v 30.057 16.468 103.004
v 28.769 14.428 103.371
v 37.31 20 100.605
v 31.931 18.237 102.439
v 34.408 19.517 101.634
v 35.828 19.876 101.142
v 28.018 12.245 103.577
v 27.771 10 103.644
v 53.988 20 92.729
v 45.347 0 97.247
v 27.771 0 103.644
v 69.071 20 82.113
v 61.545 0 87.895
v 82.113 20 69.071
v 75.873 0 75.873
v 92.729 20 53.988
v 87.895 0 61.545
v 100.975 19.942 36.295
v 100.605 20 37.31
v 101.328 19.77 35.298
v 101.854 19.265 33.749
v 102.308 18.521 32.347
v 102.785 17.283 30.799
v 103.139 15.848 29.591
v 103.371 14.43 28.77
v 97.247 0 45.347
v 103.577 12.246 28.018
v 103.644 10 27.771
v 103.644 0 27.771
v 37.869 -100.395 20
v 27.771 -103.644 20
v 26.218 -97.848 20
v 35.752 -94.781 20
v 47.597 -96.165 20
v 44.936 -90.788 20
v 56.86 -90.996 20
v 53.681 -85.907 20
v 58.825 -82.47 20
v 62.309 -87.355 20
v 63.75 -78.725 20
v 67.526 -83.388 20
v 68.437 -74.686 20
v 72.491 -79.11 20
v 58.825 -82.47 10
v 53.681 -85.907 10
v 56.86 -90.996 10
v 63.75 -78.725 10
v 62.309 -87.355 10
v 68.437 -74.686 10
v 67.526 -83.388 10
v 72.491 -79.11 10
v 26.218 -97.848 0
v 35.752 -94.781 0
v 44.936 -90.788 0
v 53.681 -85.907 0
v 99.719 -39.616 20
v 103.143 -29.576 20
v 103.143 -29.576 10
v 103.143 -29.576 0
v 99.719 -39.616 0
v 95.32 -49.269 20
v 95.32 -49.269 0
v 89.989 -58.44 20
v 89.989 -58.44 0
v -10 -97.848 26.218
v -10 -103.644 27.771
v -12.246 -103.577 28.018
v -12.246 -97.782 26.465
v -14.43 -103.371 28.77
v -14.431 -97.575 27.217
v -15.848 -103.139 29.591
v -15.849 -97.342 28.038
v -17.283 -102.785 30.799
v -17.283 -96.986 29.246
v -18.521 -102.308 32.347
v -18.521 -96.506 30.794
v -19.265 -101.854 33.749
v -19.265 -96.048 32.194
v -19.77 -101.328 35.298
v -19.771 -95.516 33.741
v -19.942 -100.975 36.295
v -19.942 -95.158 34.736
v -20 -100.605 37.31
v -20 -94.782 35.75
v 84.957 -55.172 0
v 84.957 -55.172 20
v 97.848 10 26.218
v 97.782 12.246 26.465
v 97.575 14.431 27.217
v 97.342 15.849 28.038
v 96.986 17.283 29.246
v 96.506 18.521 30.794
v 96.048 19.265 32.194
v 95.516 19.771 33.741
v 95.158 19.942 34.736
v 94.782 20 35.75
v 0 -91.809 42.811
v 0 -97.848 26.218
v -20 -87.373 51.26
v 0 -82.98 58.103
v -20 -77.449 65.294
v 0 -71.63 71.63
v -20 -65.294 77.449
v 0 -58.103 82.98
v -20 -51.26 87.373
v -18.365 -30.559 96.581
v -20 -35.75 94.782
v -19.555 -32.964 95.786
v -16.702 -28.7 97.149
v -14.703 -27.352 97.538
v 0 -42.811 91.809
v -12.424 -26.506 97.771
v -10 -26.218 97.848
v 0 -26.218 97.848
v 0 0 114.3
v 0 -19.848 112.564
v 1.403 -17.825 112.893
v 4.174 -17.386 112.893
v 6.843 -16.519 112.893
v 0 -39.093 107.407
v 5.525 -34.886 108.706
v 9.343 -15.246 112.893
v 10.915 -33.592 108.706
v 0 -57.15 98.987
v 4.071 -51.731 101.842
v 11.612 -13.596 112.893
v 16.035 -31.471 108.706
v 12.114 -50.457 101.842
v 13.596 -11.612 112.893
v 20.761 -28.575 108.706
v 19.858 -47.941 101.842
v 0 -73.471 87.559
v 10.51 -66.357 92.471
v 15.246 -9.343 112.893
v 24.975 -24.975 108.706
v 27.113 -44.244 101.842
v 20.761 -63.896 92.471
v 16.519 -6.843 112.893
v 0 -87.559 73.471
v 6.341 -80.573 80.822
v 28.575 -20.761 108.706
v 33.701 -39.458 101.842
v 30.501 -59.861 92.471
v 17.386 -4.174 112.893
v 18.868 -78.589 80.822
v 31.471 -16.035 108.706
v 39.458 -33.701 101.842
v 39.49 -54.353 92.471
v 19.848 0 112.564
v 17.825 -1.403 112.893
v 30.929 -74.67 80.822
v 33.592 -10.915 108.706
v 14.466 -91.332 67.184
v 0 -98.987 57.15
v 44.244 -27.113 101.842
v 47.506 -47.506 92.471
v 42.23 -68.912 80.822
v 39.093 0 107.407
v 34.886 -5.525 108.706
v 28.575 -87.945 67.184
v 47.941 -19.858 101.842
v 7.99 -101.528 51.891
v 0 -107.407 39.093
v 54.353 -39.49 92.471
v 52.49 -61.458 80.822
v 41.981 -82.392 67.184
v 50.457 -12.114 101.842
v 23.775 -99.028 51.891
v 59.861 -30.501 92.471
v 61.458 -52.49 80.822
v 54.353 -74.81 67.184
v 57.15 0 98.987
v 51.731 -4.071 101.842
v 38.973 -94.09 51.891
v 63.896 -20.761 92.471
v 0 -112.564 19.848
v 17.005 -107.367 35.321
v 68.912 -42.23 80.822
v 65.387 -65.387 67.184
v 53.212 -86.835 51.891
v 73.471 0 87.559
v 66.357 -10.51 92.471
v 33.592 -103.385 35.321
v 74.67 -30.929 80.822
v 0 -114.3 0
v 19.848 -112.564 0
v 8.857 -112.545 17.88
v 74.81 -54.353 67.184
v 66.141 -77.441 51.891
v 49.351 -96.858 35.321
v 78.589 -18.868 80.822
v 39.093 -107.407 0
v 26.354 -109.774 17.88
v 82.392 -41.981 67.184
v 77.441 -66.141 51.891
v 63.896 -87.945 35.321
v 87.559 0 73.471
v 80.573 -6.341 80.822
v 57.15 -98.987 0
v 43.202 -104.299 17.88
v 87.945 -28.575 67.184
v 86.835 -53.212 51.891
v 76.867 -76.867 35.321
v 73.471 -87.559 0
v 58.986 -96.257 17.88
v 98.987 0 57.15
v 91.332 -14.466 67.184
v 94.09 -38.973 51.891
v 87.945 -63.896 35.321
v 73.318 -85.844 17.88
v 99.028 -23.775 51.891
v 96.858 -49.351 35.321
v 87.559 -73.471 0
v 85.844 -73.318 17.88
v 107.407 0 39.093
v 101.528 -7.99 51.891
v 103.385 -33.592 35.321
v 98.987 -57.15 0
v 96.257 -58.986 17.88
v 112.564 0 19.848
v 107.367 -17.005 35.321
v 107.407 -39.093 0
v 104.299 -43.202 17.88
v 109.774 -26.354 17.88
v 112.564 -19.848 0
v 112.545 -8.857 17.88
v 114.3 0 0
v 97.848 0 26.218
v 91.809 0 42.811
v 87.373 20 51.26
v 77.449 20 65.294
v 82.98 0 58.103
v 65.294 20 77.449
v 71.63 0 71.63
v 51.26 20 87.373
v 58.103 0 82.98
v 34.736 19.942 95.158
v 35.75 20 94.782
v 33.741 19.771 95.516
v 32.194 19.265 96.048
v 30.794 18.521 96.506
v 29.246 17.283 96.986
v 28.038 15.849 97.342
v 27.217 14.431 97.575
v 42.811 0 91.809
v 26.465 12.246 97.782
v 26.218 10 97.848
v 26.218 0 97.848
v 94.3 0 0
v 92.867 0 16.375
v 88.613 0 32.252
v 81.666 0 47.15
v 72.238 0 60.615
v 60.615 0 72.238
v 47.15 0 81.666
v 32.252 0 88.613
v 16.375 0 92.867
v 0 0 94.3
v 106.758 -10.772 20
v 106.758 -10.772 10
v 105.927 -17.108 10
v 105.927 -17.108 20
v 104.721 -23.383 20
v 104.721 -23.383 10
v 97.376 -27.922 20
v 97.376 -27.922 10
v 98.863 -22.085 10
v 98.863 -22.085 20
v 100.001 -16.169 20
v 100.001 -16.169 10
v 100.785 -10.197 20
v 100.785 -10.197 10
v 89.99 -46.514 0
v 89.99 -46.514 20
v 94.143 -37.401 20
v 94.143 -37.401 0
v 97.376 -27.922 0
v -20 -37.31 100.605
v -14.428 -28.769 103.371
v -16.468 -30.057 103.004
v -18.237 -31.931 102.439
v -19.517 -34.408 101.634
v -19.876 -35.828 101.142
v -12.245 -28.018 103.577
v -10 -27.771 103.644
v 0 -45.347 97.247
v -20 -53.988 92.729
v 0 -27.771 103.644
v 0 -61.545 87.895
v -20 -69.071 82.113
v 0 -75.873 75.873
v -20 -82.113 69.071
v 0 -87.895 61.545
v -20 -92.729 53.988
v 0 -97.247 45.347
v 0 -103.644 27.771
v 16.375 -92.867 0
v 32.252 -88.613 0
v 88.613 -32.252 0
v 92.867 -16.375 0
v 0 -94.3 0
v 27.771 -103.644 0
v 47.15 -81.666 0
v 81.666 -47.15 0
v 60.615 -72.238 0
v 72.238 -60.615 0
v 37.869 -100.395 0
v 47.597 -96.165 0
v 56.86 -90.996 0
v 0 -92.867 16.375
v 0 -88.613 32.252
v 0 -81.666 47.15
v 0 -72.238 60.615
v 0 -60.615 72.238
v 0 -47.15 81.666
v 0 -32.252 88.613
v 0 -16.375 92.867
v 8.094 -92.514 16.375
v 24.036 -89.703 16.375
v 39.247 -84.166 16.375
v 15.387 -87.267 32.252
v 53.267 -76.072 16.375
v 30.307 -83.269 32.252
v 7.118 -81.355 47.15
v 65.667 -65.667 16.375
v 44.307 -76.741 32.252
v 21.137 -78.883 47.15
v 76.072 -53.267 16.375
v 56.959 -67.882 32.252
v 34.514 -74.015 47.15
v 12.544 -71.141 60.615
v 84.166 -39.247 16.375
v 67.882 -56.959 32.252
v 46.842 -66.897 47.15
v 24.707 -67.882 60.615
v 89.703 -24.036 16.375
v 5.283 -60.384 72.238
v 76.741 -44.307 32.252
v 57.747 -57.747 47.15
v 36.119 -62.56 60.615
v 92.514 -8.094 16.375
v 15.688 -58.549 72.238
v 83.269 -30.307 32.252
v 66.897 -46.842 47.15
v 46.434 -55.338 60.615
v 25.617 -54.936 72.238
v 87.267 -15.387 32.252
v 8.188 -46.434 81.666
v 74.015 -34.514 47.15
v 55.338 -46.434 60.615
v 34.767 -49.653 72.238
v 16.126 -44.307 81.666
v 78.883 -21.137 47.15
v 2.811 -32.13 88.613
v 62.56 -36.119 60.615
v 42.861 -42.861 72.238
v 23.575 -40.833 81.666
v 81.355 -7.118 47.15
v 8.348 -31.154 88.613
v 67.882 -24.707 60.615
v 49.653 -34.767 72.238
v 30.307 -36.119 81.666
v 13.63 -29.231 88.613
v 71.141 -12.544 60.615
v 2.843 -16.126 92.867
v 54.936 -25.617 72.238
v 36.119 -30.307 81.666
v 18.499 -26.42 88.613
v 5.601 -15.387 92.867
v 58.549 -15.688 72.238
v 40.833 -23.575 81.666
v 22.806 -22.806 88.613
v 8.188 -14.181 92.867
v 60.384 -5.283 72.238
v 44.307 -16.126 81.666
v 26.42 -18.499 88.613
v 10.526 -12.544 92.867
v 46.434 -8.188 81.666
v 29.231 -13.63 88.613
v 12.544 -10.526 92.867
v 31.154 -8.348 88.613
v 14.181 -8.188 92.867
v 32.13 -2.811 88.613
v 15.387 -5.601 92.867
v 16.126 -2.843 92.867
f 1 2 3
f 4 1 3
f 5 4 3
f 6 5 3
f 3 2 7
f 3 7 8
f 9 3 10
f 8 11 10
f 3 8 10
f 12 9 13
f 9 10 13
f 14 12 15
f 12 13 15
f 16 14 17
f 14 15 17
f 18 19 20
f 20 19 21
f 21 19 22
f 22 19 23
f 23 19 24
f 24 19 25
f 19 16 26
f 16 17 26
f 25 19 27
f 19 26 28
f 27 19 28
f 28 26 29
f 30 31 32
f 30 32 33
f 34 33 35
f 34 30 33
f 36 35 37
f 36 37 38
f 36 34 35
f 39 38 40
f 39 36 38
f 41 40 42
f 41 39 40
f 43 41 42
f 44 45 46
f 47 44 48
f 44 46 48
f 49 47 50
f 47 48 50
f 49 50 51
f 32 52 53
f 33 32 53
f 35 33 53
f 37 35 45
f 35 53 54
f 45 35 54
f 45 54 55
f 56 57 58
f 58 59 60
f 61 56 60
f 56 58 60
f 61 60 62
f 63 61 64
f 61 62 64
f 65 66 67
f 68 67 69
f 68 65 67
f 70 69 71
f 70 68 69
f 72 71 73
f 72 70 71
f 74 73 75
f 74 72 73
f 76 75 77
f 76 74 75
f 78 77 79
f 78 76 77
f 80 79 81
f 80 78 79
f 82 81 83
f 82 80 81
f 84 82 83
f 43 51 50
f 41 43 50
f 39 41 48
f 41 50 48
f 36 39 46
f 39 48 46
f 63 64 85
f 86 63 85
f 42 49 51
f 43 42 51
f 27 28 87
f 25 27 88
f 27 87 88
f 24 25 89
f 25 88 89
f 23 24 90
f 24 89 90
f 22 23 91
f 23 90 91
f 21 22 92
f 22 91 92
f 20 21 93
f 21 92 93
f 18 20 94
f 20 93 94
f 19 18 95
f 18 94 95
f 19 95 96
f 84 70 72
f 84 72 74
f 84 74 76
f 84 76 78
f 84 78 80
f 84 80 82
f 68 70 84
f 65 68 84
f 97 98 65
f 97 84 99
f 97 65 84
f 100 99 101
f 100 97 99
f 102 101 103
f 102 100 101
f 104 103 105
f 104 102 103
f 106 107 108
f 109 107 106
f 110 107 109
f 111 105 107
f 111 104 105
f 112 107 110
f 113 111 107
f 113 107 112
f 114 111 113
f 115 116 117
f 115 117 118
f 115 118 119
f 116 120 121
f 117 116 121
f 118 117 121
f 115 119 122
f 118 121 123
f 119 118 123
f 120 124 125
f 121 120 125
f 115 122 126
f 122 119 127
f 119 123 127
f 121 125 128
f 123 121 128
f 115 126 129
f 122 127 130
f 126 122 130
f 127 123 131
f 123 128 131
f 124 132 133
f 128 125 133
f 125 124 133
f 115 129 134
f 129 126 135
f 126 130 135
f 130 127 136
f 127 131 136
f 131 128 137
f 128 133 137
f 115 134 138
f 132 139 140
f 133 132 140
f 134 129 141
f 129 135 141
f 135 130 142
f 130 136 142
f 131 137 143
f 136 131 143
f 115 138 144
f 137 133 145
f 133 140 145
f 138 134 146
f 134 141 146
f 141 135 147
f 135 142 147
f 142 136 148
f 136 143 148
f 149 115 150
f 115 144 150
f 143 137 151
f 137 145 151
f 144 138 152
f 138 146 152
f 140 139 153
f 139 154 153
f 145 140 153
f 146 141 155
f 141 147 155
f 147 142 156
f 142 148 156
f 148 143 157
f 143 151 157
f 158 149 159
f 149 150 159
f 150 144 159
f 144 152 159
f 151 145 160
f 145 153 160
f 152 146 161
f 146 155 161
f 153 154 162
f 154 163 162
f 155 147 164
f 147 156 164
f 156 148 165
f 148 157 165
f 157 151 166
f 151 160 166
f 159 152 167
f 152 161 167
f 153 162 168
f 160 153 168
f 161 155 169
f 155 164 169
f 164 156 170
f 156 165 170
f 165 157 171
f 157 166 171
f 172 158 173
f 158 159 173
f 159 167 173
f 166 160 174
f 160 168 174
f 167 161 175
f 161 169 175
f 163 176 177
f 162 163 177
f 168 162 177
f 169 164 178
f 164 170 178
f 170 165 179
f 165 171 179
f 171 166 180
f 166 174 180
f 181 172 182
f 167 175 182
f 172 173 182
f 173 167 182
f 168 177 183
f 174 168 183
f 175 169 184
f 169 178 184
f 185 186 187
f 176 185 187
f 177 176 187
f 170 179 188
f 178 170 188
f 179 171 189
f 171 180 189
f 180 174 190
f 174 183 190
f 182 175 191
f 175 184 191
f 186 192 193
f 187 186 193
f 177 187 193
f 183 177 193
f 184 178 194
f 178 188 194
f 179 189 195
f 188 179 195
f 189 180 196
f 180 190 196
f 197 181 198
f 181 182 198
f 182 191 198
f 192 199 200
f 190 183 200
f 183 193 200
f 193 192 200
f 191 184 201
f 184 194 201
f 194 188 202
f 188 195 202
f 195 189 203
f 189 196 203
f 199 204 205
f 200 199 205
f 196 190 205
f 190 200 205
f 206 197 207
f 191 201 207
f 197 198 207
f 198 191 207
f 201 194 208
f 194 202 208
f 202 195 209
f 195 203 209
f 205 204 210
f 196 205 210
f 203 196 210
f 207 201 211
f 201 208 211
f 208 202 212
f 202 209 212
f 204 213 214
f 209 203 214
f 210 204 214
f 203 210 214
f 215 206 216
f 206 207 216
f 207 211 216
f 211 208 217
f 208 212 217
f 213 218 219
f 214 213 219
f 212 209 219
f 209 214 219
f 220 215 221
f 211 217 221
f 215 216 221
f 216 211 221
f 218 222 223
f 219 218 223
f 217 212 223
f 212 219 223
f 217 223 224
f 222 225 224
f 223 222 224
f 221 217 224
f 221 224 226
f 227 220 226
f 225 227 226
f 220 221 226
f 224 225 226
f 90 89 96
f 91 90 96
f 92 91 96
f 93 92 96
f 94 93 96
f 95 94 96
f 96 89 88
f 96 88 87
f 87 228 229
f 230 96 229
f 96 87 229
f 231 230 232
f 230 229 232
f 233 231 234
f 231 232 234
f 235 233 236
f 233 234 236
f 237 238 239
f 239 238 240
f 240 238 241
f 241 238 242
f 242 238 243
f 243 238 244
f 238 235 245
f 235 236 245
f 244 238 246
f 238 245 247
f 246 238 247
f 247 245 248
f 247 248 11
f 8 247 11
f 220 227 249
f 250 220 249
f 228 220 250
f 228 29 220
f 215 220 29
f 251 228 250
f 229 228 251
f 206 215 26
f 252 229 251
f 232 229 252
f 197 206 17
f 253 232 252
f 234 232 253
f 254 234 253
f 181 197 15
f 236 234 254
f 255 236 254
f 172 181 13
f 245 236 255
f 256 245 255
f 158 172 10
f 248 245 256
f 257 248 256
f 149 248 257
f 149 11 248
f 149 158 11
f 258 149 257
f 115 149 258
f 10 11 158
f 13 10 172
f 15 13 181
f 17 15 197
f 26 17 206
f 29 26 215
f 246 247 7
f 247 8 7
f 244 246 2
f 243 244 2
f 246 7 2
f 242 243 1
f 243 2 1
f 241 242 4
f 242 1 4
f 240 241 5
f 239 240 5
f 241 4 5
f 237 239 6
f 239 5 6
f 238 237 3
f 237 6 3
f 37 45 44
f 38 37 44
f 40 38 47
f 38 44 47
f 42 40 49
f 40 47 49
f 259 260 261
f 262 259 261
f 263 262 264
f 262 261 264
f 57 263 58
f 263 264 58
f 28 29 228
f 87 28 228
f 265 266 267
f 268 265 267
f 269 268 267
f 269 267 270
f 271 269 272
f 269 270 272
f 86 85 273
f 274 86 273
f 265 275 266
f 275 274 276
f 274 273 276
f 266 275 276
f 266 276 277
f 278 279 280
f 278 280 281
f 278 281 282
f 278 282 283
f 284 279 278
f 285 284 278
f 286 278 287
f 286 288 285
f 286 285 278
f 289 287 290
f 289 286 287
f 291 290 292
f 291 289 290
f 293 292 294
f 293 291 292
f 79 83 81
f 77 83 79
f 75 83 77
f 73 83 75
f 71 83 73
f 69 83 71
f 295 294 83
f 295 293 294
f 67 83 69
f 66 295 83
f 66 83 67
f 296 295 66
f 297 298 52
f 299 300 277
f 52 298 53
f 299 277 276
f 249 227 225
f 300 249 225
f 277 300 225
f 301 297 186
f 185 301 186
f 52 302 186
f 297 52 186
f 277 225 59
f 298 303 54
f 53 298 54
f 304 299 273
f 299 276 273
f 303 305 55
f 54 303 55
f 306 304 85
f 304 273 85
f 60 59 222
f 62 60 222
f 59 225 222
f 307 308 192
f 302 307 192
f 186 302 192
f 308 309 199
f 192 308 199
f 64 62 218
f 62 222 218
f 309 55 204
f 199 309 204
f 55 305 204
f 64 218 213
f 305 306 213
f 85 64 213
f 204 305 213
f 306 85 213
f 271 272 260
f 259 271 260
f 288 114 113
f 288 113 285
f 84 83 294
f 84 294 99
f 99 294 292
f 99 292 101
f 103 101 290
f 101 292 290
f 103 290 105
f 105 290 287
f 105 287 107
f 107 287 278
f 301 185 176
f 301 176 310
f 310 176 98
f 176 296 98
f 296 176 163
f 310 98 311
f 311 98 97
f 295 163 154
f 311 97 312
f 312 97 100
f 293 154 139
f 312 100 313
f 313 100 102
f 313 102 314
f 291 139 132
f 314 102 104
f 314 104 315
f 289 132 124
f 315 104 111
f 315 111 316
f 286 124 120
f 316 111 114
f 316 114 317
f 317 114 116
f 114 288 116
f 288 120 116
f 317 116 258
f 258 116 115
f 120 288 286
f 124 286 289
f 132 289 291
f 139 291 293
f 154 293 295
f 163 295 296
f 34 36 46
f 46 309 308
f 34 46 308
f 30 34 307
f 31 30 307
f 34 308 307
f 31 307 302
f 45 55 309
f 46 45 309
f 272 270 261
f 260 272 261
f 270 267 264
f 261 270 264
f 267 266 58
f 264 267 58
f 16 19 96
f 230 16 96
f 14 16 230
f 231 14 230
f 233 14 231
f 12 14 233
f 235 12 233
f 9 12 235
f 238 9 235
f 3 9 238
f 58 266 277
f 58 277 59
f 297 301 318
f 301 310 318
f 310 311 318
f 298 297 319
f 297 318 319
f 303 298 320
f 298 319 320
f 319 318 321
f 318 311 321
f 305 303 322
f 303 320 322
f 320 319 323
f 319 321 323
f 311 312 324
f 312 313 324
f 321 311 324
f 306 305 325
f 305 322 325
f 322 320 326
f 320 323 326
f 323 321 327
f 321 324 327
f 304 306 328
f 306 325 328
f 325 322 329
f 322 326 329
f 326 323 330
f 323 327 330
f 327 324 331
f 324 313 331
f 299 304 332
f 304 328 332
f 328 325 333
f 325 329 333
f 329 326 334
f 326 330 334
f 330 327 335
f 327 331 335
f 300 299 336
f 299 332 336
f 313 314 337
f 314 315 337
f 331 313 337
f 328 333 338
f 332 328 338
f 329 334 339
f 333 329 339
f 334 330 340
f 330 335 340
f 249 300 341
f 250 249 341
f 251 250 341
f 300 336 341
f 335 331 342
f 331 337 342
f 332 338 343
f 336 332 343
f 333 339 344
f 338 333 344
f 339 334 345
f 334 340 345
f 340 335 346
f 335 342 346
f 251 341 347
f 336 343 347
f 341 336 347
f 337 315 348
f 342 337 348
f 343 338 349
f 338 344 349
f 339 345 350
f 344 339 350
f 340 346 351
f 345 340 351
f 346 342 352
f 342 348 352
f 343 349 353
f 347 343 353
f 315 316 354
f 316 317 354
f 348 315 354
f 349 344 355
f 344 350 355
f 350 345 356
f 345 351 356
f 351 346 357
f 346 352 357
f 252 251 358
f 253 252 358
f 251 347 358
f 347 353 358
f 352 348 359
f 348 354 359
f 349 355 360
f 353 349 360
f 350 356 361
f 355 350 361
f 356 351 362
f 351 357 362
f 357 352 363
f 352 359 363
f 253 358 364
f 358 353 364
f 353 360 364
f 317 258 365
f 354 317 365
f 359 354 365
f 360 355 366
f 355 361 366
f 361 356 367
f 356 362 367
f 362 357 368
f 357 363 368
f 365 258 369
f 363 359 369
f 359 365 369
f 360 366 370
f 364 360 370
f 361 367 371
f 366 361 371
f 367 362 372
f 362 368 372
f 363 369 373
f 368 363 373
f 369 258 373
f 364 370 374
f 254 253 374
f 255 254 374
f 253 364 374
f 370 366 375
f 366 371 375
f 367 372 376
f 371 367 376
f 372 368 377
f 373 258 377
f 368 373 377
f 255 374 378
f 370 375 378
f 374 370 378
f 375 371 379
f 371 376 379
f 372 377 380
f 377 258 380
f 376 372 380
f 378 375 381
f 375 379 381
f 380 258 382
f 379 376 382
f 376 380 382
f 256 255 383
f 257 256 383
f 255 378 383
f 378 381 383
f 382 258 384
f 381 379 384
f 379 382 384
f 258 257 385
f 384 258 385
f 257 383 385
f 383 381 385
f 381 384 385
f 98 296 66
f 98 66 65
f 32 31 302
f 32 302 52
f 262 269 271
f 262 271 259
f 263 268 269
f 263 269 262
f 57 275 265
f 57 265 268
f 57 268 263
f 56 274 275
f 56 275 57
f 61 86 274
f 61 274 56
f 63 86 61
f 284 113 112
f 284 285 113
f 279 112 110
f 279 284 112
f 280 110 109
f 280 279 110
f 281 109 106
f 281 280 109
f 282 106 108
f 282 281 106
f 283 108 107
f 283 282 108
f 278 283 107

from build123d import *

# Parameters (mm, degrees)
F1_ANGLE  = 90
F3_DEPTH  = 20
F5_DEPTH  = 20
F7_DEPTH  = 20
F8_R      = 10
F11_DEPTH = 10


with BuildPart() as f1:
    # F0 (on Right) → F1 (revolve)
    with BuildSketch(Plane.YZ):
        with BuildLine():
            Line((0, 94.3), (0, 114.3))
            ThreePointArc((0, 114.3), (-80.8223050896, 80.8223050896), (-114.3, 0))
            Line((-114.3, 0), (-94.3, 0))
            ThreePointArc((-94.3, 0), (-66.6801694659, 66.6801694659), (0, 94.3))
        make_face()
    revolve(axis=Axis((0, 0, 104.3), (0, 0, 1)), revolution_arc=F1_ANGLE)

    # F2 (on face) → F3 (join)
    with BuildSketch(Plane(origin=(0, 0, 0), x_dir=(-1, 0, 0), z_dir=(0, 1, 0))):
        with BuildLine():
            Line((-26.2183692689, 97.8482862031), (-27.7712835395, 103.6438411608))
            ThreePointArc((-27.7712835395, 103.6438411608), (-75.8725576213, 75.8725576213), (-103.6438411608, 27.7712835395))
            Line((-103.6438411608, 27.7712835395), (-97.8482862031, 26.2183692689))
            ThreePointArc((-97.8482862031, 26.2183692689), (-71.6299169342, 71.6299169342), (-26.2183692689, 97.8482862031))
        make_face()
    extrude(amount=F3_DEPTH)

    # F4 (on face) → F5 (join)
    with BuildSketch(Plane.YZ):
        with BuildLine():
            ThreePointArc((-97.8482862031, 26.2183692689), (-71.6299169342, 71.6299169342), (-26.2183692689, 97.8482862031))
            Line((-26.2183692689, 97.8482862031), (-27.7712835395, 103.6438411608))
            ThreePointArc((-27.7712835395, 103.6438411608), (-75.8725576213, 75.8725576213), (-103.6438411608, 27.7712835395))
            Line((-103.6438411608, 27.7712835395), (-97.8482862031, 26.2183692689))
        make_face()
    extrude(amount=-F5_DEPTH)

    # F6 (on face) → F7 (cut)
    with BuildSketch(Plane(origin=(0, 0, 0), x_dir=(1, 0, 0), z_dir=(0, 0, -1))):
        with BuildLine():
            Line((27.7712835395, 103.6438411608), (26.2183692689, 97.8482862031))
            ThreePointArc((26.2183692689, 97.8482862031), (40.3932806821, 92.8981855352), (53.6808214668, 85.9072721406))
            Line((53.6808214668, 85.9072721406), (56.8603370522, 90.9955607176))
            ThreePointArc((56.8603370522, 90.9955607176), (42.7857750957, 98.4005459815), (27.7712835395, 103.6438411608))
        make_face()
        with BuildLine():
            ThreePointArc((84.9573285329, 55.171934247), (92.1790767398, 42.0084254811), (97.3758097986, 27.9220641443))
            Line((97.3758097986, 27.9220641443), (103.1433799742, 29.5758882792))
            ThreePointArc((103.1433799742, 29.5758882792), (97.6388443651, 44.496584937), (89.9893519405, 58.4397684571))
            Line((89.9893519405, 58.4397684571), (84.9573285329, 55.171934247))
        make_face()
    extrude(amount=-F7_DEPTH, mode=Mode.SUBTRACT)

    # F8
    f8_edges = [f1.edges().sort_by_distance(p)[0] for p in [
        (100.746064, 20, 26.994826),
        (26.994826, 20, 100.746064),
        (-20, -26.994826, 100.746064),
        (-20, -100.746064, 26.994826),
    ]]
    fillet(f8_edges, radius=F8_R)

    # F10 (on offset) → F11 (cut)
    with BuildSketch(Plane(origin=(0, 0, 10), x_dir=(1, 0, 0), z_dir=(0, 0, -1))):
        with BuildLine():
            ThreePointArc((97.3758097986, 27.9220641443), (99.4762319066, 19.1355503099), (100.7854867979, 10.1968451452))
            Line((100.7854867979, 10.1968451452), (106.7579299629, 10.7719260129))
            ThreePointArc((106.7579299629, 10.7719260129), (105.3709505868, 20.2546975401), (103.1433799742, 29.5758882792))
            Line((103.1433799742, 29.5758882792), (97.3758097986, 27.9220641443))
        make_face()
        Polygon((0.327321584, 0.5238240331), (0, 0), (0.4947707785, 0.5399475566), align=None)
        Polygon((0.4947707785, 0.5399475566), (0, 0), (2.5848787999, 0.7412020686), align=None)
        with BuildLine():
            Line((56.8603370522, 90.9955607176), (53.6808214668, 85.9072721406))
            ThreePointArc((53.6808214668, 85.9072721406), (61.3162809887, 80.6350028568), (68.4372880315, 74.6861942189))
            Line((68.4372880315, 74.6861942189), (72.4908292772, 79.1098582397))
            ThreePointArc((72.4908292772, 79.1098582397), (64.948044917, 85.411014872), (56.8603370522, 90.9955607176))
        make_face()
    extrude(amount=-F11_DEPTH, mode=Mode.SUBTRACT)


solid = f1.part
